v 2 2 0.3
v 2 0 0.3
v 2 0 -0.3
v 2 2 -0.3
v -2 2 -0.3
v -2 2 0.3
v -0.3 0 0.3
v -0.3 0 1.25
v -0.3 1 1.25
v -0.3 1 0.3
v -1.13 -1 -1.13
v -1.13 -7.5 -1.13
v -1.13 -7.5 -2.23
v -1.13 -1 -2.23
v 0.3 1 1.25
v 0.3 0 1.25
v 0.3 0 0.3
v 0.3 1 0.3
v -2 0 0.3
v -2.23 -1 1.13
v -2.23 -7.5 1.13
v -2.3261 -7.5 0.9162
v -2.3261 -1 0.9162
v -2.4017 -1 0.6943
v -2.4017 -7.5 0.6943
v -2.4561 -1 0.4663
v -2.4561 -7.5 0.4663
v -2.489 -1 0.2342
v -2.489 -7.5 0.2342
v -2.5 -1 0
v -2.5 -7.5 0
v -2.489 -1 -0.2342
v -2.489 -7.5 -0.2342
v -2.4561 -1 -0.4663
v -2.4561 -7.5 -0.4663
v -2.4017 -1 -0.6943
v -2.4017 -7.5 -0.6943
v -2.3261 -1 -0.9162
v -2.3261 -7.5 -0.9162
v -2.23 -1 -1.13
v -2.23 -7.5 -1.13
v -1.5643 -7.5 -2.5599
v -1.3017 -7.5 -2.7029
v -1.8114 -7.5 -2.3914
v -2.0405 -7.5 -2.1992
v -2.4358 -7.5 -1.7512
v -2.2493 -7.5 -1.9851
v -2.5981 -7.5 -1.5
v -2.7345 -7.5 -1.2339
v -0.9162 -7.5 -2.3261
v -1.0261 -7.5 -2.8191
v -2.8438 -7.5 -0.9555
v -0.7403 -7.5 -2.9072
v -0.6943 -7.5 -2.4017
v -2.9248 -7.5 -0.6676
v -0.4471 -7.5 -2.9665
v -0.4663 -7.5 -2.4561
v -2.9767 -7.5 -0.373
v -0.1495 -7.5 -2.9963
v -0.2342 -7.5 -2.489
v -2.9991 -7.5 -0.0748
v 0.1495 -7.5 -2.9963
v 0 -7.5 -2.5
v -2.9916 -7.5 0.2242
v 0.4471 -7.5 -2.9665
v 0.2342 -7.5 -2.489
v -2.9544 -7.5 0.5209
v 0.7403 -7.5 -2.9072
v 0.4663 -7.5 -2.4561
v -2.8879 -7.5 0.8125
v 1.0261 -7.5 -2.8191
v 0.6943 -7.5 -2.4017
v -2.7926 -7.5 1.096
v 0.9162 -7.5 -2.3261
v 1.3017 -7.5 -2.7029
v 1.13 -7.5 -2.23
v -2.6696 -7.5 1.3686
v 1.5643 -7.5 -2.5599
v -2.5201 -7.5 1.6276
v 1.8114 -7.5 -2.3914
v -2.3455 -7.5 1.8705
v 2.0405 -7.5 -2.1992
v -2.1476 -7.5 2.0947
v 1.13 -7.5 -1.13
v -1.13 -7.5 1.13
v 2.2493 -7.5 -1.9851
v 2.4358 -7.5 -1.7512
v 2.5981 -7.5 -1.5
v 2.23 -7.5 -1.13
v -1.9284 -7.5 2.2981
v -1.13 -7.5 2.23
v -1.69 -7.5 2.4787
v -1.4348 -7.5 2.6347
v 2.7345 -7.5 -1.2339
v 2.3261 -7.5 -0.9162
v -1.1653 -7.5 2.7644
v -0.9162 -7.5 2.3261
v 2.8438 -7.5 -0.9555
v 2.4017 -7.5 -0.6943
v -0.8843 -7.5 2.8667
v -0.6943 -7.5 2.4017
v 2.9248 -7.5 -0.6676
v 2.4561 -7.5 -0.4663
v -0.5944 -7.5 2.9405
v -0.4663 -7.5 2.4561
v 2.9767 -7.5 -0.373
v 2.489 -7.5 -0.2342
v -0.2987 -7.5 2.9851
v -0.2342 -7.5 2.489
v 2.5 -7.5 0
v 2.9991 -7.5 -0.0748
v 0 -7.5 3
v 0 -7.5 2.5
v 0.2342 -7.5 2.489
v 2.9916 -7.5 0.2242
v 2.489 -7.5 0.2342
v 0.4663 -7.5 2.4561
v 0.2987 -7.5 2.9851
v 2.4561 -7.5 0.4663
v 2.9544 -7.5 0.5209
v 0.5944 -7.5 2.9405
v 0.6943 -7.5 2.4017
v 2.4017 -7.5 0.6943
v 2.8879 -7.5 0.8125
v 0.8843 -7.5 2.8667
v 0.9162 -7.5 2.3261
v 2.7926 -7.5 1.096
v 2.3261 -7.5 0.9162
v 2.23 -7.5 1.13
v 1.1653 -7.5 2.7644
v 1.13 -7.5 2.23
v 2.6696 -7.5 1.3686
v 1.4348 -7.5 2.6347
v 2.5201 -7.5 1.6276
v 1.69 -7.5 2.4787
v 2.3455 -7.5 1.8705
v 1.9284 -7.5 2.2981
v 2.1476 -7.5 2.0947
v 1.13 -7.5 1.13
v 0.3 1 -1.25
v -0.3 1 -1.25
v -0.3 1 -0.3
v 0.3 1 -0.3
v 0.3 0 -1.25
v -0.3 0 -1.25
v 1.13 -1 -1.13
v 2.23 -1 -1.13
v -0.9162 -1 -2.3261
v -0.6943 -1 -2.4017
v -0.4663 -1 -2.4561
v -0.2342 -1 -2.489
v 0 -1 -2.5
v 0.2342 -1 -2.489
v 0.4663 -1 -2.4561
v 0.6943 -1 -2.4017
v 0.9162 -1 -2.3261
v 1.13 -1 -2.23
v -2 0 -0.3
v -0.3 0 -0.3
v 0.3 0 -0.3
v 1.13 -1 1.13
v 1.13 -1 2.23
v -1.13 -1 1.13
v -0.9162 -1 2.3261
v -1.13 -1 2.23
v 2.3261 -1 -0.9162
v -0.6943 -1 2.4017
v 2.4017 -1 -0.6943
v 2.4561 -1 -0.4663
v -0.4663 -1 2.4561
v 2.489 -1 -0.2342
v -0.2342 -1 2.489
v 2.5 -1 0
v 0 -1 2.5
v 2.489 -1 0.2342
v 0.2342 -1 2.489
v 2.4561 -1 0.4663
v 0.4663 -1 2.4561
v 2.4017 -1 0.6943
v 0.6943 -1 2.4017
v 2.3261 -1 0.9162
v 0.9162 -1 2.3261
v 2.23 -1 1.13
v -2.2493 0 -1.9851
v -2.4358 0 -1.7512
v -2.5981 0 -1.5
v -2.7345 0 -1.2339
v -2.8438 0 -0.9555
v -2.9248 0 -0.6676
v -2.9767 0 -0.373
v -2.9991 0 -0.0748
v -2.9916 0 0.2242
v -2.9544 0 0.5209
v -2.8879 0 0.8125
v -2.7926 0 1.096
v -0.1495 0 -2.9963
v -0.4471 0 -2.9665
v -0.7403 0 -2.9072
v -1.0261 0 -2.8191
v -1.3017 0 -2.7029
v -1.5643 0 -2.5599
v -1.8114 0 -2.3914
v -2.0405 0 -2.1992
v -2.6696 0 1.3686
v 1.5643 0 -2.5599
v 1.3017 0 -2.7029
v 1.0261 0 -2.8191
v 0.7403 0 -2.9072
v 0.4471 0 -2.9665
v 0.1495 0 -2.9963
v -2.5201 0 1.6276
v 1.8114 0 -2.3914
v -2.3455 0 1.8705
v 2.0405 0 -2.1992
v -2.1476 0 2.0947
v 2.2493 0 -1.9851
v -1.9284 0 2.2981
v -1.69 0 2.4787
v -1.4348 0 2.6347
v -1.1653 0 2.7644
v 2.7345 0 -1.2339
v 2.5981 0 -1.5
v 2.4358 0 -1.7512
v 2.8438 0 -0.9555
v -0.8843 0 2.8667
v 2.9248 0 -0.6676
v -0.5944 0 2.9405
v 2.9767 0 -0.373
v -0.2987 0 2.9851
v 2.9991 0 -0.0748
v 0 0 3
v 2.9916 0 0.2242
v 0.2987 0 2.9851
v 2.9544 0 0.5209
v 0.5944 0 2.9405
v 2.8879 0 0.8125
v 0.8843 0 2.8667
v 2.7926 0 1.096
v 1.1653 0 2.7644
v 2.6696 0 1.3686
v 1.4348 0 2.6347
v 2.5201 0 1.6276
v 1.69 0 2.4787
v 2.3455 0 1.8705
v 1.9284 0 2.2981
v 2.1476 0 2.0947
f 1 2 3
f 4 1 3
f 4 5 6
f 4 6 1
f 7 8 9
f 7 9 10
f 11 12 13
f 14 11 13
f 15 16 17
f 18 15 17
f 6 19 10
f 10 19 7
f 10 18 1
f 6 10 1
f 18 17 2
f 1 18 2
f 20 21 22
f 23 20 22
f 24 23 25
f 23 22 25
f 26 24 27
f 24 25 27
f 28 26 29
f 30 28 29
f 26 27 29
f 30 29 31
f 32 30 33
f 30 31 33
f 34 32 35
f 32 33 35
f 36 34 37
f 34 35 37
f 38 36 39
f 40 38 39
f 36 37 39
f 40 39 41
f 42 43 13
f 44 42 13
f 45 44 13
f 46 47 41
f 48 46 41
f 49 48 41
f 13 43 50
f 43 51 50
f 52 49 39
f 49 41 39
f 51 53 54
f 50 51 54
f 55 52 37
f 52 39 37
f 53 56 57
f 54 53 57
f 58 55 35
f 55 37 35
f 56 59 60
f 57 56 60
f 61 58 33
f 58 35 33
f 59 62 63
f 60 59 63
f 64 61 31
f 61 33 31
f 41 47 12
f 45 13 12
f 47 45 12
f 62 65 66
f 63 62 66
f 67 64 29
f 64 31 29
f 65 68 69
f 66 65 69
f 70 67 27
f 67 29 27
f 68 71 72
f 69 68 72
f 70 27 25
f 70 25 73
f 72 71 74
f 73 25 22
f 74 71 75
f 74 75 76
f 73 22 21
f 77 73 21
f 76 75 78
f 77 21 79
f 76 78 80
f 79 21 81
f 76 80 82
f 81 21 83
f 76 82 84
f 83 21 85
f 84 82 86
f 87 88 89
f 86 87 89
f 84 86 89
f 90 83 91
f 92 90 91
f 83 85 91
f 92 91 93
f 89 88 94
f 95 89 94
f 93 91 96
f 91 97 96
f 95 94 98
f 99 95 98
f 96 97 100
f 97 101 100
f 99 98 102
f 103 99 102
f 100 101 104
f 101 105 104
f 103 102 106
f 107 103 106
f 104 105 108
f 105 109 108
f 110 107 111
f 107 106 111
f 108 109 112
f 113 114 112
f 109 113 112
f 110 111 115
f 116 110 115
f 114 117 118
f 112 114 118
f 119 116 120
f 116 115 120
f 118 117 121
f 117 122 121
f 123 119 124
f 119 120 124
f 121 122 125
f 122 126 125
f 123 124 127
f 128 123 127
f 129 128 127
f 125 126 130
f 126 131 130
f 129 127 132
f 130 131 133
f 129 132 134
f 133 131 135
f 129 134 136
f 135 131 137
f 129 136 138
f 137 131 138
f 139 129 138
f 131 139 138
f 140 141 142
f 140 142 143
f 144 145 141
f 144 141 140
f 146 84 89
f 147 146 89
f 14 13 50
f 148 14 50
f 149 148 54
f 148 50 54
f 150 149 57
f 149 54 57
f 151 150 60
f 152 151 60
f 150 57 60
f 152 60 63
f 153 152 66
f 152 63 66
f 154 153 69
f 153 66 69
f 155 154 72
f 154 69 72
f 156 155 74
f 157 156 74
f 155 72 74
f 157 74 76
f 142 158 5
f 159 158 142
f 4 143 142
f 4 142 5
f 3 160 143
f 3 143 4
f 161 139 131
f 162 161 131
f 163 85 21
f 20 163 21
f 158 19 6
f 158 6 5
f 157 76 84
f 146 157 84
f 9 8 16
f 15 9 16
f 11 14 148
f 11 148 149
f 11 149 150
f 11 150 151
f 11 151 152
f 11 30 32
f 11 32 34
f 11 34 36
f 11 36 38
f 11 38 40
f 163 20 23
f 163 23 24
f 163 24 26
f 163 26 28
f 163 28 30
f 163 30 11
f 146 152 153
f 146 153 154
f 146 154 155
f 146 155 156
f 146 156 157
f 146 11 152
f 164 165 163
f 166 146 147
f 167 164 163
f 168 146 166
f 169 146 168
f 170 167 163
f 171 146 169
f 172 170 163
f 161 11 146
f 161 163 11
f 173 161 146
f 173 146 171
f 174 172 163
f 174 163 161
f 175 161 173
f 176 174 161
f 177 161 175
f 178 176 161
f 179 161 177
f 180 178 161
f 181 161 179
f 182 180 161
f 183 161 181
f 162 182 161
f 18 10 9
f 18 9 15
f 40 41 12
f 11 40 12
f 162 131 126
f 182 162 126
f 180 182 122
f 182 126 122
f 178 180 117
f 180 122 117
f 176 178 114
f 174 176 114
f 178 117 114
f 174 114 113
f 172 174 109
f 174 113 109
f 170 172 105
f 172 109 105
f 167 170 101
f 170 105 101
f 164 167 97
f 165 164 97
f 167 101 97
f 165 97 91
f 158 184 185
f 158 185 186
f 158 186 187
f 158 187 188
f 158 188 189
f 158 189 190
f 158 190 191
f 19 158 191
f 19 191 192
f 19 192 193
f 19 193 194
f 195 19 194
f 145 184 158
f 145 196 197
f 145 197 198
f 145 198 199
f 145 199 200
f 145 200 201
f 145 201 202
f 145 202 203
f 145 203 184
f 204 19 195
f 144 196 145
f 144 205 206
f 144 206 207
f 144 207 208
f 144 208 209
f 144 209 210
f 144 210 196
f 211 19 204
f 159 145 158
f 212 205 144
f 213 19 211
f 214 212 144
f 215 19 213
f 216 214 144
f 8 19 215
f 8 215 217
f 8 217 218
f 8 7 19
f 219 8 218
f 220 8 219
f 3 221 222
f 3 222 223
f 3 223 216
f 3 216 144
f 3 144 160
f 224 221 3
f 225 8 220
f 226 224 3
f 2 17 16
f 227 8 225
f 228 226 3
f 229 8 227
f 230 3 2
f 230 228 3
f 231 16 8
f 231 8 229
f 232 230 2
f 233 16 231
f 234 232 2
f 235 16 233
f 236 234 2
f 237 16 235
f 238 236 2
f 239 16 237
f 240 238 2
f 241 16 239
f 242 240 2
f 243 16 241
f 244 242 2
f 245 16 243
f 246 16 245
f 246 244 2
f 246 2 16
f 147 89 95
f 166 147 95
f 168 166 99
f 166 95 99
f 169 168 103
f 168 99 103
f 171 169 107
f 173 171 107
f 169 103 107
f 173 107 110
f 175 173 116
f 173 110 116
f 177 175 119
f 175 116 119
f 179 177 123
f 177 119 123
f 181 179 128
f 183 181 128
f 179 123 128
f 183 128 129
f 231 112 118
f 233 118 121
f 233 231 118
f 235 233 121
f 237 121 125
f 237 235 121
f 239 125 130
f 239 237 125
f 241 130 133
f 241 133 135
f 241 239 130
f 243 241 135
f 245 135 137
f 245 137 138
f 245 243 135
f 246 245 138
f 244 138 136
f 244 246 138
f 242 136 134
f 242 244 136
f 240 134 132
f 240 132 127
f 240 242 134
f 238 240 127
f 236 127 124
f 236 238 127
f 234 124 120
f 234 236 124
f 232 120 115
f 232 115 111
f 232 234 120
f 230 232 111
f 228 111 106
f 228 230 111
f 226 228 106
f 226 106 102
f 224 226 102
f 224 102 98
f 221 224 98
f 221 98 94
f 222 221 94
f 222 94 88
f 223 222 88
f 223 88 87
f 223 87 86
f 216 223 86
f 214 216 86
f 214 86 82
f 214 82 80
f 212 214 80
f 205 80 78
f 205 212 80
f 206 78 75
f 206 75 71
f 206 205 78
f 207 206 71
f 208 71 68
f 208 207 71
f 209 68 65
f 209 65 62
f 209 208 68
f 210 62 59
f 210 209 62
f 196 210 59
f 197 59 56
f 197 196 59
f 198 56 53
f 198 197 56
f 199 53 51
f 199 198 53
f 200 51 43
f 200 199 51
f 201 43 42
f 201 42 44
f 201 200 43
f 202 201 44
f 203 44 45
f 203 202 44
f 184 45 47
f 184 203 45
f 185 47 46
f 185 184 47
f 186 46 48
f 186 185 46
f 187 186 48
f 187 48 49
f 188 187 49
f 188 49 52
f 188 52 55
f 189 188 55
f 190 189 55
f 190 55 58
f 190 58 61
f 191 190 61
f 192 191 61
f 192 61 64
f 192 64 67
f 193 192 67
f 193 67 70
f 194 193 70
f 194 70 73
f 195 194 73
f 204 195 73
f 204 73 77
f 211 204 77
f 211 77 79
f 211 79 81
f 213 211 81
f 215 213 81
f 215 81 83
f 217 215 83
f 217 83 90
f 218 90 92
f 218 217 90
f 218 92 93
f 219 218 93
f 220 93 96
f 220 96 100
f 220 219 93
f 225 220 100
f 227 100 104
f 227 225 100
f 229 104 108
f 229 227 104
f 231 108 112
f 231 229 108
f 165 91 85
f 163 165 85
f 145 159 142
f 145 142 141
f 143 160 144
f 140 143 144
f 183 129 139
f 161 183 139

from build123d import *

# Parameters (mm, degrees)
SKETCH_1_W          = 4
SKETCH_1_H          = 0.6
EXTRUDE_1_DEPTH     = 2
SKETCH_1_3_W        = 0.6
SKETCH_1_3_H        = 2.5
EXTRUDE_2_DEPTH     = 1
SKETCH_1_4_R        = 3
EXTRUDE_3_DEPTH     = 7.5
CUT_EXTRUDE_1_DEPTH = 6.5


with BuildPart() as part:
    # 草图1 → 凸台-拉伸1 (new body)
    with BuildSketch(Plane(origin=(0, 0, 0), x_dir=(1, 0, 0), z_dir=(0, 1, 0))):
        Rectangle(SKETCH_1_W, SKETCH_1_H)
    extrude(amount=EXTRUDE_1_DEPTH)

    # 草图1<3> → 凸台-拉伸2 (add)
    with BuildSketch(Plane(origin=(0, 0, 0), x_dir=(1, 0, 0), z_dir=(0, 1, 0))):
        Rectangle(SKETCH_1_3_W, SKETCH_1_3_H)
    extrude(amount=EXTRUDE_2_DEPTH)

    # 草图1<4> → 凸台-拉伸3 (add)
    with BuildSketch(Plane(origin=(0, 0, 0), x_dir=(1, 0, 0), z_dir=(0, 1, 0))):
        with Locations(Location((0, 0, 0), (0, 0, 270))):
            Circle(SKETCH_1_4_R)
    extrude(amount=-EXTRUDE_3_DEPTH)

    # 草图2 → 切除-拉伸1 (cut)
    with BuildSketch(Plane.XZ.offset(7.5)):
        with BuildLine():
            ThreePointArc((-1.130029762, -2.230029762), (0, -2.5), (1.130029762, -2.230029762))
            Line((1.130029762, -2.230029762), (1.130029762, -1.130029762))
            Line((1.130029762, -1.130029762), (2.230029762, -1.130029762))
            ThreePointArc((2.230029762, -1.130029762), (2.5, 0), (2.230029762, 1.130029762))
            Line((2.230029762, 1.130029762), (1.130029762, 1.130029762))
            Line((1.130029762, 1.130029762), (1.130029762, 2.230029762))
            ThreePointArc((1.130029762, 2.230029762), (0, 2.5), (-1.130029762, 2.230029762))
            Line((-1.130029762, 2.230029762), (-1.130029762, 1.130029762))
            Line((-1.130029762, 1.130029762), (-2.230029762, 1.130029762))
            ThreePointArc((-2.230029762, 1.130029762), (-2.5, 0), (-2.230029762, -1.130029762))
            Line((-2.230029762, -1.130029762), (-1.130029762, -1.130029762))
            Line((-1.130029762, -1.130029762), (-1.130029762, -2.230029762))
        make_face()
    extrude(amount=-CUT_EXTRUDE_1_DEPTH, mode=Mode.SUBTRACT)


solid = part.part
